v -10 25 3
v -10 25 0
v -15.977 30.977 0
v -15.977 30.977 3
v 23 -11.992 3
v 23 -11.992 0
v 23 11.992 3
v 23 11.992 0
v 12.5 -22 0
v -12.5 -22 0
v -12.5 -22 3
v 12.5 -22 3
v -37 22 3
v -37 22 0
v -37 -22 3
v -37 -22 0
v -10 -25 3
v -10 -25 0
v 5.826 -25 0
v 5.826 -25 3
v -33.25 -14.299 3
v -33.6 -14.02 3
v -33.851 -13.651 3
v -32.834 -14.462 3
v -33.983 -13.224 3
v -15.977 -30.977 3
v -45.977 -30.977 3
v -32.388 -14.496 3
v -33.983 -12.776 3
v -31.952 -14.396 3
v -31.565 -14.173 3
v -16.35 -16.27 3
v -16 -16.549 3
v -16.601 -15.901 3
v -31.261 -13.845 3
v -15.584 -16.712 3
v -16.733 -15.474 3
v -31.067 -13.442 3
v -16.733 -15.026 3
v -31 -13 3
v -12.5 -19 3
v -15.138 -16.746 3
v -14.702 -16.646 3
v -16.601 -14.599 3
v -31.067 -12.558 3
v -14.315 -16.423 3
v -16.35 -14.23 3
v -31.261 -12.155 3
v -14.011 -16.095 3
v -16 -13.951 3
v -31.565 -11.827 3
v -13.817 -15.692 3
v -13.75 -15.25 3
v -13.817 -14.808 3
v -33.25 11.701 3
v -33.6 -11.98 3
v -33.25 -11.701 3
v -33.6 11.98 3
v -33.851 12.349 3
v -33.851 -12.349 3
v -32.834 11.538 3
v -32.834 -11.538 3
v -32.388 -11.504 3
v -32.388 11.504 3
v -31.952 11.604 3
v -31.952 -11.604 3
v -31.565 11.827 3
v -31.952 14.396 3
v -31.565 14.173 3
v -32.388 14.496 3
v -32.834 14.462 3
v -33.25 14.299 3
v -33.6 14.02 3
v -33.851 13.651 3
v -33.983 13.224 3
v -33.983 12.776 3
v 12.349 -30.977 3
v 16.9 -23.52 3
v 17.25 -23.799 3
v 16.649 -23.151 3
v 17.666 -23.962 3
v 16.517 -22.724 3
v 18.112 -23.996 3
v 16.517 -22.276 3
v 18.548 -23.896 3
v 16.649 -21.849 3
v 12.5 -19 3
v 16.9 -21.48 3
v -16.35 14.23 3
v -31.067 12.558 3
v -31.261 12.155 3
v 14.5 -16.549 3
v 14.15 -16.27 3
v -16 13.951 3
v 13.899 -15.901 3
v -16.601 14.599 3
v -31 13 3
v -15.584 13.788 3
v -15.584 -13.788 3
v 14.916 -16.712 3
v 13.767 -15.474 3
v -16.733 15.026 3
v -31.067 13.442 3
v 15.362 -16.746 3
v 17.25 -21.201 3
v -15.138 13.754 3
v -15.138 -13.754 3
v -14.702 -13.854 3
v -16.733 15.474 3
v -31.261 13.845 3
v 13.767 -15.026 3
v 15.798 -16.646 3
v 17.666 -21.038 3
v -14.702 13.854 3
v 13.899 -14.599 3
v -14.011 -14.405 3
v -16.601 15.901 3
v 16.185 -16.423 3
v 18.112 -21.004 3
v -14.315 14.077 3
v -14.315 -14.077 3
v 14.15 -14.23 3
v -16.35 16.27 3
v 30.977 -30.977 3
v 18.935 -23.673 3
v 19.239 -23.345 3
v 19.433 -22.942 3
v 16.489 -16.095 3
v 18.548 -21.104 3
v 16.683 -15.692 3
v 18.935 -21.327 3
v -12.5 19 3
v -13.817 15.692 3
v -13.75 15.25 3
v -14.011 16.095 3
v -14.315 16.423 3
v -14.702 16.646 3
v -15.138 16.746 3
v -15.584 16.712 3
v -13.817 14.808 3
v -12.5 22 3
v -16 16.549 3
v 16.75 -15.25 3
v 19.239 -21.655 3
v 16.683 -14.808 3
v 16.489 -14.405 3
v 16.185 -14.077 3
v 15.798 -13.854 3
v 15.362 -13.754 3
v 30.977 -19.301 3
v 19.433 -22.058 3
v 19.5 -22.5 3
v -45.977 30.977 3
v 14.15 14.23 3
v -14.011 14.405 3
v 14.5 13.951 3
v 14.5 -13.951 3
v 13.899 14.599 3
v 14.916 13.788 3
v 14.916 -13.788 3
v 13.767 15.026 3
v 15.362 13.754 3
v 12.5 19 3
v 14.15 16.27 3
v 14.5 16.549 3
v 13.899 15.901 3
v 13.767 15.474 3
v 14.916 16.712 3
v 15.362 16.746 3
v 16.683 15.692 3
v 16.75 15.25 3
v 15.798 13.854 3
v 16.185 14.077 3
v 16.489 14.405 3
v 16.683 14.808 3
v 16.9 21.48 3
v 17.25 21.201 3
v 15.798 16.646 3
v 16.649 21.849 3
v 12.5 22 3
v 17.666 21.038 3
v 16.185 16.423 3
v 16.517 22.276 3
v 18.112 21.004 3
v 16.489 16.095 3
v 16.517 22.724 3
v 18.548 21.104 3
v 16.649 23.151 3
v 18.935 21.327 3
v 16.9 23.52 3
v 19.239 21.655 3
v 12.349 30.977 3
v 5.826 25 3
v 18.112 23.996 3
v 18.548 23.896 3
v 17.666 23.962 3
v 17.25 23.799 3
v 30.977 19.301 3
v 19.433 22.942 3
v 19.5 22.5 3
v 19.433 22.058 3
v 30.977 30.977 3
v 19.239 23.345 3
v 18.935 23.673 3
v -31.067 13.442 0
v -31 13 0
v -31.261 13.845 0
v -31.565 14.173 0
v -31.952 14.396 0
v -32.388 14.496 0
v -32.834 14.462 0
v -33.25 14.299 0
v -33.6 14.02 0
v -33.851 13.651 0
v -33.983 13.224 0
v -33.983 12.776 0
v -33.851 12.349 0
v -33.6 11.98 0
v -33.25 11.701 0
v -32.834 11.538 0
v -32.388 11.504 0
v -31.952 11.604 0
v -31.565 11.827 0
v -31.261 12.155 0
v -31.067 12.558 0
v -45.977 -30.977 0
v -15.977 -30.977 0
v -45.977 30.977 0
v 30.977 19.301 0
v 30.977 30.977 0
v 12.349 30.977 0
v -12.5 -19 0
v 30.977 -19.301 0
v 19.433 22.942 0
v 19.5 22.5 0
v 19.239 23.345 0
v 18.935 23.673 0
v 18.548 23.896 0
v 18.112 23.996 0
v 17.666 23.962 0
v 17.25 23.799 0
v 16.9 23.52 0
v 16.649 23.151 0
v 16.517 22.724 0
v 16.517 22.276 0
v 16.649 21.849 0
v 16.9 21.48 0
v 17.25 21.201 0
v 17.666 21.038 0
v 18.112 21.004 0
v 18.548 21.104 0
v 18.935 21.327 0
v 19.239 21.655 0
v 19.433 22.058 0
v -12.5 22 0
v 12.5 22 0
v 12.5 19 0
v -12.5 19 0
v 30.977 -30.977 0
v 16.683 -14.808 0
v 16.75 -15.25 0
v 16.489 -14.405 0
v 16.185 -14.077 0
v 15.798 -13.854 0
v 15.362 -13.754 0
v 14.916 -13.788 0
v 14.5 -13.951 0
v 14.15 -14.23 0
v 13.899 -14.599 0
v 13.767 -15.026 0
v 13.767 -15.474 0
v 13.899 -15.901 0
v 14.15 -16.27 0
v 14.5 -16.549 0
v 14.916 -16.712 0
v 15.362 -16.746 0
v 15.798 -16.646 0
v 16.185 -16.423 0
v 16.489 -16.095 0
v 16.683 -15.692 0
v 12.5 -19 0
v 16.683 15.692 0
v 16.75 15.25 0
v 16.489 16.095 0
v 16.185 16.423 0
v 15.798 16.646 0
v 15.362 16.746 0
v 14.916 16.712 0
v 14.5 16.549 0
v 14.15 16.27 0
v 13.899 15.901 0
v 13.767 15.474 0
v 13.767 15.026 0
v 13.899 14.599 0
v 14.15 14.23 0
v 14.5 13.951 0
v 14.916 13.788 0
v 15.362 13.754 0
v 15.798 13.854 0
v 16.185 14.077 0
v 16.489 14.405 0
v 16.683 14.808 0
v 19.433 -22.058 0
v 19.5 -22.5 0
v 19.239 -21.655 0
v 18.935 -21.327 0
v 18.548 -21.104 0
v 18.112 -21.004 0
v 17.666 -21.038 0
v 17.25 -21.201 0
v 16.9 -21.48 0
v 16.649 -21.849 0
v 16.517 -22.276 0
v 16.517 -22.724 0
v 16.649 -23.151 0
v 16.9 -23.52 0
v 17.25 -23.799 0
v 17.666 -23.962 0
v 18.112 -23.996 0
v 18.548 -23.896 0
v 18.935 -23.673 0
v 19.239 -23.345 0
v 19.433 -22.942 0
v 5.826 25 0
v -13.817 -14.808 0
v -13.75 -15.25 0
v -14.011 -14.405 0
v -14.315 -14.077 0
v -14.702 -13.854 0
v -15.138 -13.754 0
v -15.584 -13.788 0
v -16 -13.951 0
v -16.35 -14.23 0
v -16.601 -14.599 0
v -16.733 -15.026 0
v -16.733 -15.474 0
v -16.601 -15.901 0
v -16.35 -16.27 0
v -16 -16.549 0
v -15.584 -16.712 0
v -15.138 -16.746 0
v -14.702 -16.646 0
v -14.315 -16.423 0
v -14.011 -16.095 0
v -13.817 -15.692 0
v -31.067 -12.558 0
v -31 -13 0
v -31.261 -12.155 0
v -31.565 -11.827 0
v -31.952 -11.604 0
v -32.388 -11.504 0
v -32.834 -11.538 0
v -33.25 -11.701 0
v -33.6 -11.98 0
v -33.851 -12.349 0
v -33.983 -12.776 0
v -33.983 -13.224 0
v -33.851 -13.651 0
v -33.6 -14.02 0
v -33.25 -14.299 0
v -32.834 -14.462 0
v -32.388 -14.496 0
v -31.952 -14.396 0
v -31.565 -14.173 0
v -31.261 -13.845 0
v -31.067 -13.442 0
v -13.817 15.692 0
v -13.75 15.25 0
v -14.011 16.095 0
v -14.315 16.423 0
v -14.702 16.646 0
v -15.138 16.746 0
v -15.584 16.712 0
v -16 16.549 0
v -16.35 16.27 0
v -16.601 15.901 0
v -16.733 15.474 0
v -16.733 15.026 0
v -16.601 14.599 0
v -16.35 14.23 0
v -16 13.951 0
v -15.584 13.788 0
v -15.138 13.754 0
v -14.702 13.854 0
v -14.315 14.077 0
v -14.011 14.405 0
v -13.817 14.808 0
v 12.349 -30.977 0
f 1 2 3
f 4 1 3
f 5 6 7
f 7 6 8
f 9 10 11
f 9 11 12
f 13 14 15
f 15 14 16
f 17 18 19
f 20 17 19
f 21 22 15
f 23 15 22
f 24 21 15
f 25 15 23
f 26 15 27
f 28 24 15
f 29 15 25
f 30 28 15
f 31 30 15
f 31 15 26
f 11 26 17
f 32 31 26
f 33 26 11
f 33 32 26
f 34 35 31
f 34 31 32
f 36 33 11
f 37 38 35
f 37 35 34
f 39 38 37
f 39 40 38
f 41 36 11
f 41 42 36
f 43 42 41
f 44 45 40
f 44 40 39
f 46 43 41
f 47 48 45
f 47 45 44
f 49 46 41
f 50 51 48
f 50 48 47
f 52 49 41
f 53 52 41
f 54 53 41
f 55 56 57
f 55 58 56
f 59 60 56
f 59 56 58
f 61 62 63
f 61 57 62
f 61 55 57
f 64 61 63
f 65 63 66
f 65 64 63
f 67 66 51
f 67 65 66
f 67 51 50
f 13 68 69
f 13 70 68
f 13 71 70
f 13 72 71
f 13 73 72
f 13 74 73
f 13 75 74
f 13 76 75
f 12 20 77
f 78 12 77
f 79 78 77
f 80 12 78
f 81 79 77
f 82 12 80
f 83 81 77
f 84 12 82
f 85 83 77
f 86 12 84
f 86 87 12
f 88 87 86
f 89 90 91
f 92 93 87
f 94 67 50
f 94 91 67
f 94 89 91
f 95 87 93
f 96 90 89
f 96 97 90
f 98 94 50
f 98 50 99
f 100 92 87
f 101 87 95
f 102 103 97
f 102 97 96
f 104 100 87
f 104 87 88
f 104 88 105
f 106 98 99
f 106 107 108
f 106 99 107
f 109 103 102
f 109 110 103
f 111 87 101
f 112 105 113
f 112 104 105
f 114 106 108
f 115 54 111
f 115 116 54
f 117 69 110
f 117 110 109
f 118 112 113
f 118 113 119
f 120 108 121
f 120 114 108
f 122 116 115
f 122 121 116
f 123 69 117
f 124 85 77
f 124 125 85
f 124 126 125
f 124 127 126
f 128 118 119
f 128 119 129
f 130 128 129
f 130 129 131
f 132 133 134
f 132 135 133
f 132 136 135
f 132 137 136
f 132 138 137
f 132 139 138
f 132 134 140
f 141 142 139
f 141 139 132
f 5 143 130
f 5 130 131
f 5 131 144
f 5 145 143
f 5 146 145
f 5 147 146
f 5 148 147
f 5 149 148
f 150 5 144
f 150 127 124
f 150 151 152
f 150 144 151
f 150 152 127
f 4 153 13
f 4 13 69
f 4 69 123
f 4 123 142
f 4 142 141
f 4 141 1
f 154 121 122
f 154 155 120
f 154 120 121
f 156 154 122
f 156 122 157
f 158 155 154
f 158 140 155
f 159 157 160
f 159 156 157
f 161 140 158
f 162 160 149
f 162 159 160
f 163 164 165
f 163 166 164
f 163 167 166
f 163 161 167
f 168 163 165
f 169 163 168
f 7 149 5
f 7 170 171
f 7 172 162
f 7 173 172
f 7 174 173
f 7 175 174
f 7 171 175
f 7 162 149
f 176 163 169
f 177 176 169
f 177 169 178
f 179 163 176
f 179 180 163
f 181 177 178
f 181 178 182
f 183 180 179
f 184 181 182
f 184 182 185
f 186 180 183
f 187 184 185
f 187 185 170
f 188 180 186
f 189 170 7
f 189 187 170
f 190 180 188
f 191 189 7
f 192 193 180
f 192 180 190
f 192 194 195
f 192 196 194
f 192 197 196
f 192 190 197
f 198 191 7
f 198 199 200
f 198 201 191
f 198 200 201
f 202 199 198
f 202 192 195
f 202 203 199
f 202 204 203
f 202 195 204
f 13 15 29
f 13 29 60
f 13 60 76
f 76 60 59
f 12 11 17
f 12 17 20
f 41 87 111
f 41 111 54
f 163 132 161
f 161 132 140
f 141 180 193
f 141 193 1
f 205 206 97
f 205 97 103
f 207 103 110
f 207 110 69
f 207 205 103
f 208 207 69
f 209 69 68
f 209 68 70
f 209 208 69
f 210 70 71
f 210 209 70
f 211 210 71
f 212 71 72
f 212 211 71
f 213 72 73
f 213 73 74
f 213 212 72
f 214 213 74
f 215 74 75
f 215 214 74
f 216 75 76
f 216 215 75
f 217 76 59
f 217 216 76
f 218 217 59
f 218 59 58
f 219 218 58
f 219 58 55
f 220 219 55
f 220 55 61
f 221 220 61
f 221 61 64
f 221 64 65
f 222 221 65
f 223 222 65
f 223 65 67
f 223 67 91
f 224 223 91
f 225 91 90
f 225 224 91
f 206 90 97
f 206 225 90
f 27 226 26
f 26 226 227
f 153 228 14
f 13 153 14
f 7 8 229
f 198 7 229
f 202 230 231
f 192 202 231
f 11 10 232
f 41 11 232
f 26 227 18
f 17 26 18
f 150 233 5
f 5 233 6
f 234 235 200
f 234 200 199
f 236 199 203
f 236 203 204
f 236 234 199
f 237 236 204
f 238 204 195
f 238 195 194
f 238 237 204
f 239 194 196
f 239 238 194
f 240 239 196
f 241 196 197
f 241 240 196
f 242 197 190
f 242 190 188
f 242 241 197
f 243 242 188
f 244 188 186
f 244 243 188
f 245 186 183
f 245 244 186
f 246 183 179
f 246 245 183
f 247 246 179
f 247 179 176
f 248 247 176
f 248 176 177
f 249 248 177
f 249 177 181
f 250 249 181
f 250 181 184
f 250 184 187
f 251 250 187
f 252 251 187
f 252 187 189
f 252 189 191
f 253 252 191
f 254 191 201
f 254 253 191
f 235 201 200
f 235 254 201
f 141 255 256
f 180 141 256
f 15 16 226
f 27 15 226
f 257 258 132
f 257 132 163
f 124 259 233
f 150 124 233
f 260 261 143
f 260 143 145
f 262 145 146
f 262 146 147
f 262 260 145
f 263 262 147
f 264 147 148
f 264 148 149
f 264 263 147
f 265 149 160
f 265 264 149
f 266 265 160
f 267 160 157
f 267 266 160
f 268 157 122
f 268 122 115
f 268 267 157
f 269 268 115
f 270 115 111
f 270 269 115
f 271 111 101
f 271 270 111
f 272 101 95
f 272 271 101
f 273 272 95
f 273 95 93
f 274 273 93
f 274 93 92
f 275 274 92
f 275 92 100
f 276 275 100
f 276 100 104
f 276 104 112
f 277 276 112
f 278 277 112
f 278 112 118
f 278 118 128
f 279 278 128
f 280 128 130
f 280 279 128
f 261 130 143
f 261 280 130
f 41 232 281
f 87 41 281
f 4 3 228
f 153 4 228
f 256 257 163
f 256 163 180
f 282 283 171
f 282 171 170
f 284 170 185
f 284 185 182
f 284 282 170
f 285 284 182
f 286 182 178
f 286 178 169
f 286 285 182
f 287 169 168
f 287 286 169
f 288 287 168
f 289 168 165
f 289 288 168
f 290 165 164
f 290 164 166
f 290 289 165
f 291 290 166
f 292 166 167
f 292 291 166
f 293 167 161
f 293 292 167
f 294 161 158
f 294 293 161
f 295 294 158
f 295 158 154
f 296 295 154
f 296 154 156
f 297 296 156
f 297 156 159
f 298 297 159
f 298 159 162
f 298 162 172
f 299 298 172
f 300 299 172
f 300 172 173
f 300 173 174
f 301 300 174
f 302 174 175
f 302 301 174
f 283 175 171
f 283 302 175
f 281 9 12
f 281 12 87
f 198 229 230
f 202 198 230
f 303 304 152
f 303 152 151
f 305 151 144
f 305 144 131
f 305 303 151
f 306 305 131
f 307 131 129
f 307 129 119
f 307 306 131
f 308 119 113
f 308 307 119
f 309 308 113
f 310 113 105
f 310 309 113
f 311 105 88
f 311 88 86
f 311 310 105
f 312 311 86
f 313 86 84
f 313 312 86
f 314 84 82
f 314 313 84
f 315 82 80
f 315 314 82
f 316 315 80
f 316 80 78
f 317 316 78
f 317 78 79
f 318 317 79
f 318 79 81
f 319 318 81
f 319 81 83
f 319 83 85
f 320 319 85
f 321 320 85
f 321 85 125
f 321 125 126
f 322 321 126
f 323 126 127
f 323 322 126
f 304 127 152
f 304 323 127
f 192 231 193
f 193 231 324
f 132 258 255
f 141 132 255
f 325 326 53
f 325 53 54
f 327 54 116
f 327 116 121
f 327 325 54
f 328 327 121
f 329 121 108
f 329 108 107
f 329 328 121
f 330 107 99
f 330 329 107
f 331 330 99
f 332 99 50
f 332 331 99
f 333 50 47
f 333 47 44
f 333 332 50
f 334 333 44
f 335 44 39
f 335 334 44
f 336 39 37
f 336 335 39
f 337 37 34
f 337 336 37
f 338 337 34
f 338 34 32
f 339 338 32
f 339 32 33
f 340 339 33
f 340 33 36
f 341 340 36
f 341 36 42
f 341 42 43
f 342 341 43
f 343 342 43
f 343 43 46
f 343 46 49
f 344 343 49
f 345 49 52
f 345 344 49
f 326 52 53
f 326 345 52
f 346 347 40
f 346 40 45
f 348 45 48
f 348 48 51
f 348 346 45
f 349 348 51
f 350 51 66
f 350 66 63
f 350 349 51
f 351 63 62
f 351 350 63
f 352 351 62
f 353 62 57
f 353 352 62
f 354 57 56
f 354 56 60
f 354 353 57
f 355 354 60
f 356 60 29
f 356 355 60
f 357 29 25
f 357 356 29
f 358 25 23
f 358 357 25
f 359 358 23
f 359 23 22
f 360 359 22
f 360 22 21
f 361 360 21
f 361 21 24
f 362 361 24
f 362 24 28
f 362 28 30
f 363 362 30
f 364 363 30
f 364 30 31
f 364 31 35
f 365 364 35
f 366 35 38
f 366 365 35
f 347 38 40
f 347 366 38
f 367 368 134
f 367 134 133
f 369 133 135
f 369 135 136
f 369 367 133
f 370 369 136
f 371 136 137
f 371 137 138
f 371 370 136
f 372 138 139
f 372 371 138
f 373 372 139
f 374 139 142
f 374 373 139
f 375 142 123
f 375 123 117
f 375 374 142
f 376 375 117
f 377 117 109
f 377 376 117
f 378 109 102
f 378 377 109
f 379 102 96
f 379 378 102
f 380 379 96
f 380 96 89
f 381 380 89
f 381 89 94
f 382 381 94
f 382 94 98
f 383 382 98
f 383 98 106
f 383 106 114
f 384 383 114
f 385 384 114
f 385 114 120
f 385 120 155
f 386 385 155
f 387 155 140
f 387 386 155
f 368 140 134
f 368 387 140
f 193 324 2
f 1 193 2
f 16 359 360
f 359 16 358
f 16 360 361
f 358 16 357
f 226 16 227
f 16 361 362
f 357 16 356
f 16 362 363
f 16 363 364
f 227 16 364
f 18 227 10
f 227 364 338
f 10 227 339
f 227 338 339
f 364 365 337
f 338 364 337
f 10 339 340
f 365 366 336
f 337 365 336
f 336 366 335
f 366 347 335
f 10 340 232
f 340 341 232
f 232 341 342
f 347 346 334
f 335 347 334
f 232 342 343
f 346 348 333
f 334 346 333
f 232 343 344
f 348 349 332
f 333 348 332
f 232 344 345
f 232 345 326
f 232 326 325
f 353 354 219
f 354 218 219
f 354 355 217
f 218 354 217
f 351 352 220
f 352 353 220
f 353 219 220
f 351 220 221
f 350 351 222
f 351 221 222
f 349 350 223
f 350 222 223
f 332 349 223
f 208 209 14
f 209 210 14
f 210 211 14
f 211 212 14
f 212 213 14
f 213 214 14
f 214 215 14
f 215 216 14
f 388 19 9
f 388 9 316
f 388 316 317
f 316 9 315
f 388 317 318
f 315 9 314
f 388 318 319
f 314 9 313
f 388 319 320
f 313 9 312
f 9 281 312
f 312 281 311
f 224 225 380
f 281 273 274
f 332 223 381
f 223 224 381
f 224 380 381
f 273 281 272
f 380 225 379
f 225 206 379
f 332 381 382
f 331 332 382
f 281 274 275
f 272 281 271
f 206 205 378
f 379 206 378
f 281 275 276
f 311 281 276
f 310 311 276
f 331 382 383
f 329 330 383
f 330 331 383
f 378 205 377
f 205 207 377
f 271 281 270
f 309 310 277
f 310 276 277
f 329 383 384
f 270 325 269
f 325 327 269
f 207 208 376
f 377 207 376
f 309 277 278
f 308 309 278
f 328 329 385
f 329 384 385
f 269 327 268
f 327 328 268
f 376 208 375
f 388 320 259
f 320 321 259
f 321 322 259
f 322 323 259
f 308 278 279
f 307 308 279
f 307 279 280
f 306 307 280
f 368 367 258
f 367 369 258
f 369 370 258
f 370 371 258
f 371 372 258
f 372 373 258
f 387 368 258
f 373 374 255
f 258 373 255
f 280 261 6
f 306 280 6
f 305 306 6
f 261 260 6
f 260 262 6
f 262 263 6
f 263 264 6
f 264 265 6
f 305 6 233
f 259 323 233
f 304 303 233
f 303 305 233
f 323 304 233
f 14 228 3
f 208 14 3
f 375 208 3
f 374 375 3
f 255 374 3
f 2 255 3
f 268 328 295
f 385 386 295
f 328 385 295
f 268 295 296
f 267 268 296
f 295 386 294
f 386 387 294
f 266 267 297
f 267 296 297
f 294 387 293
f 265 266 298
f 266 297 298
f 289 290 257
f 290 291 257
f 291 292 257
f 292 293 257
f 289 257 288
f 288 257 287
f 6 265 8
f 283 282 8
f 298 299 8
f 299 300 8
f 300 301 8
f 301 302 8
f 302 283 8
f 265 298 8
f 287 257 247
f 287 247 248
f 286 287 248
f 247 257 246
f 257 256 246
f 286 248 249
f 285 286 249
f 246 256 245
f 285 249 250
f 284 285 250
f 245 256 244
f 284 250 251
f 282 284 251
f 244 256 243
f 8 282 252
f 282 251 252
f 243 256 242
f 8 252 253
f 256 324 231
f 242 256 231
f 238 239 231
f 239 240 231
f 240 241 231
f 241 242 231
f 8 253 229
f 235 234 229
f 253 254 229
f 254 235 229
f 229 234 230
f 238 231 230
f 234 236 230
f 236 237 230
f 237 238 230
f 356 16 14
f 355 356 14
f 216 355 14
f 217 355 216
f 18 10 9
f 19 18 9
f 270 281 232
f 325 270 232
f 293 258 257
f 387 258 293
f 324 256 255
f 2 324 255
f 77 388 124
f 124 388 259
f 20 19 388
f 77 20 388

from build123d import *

# Parameters (mm, degrees)
F0_R     = 1.5
F0_W     = 25
F0_H     = 3
F1_DEPTH = 3


with BuildPart() as f1:
    # F0 (on Top) → F1 (new body)
    with BuildSketch(Plane.XY):
        Polygon((5.826227, 25), (-10, 25), (-15.97664, 30.97664), (-45.976639, 30.97664), (-37, 22), (-37, -22), (-45.976639, -30.97664), (-15.97664, -30.97664), (-10, -25), (5.826227, -25), (12.348584, -30.97664), (30.97664, -30.97664), (30.97664, -19.30114), (23, -11.991897), (23, 11.991897), (30.97664, 19.30114), (30.97664, 30.97664), (12.348584, 30.97664), align=None)
        with Locations((-32.5, -13)):
            Circle(F0_R, mode=Mode.SUBTRACT)
        with Locations((-15.25, -15.25)):
            Circle(F0_R, mode=Mode.SUBTRACT)
        with Locations((0, -20.5)):
            Rectangle(F0_W, F0_H, mode=Mode.SUBTRACT)
        with Locations((18, -22.5)):
            Circle(F0_R, mode=Mode.SUBTRACT)
        with Locations((15.25, -15.25)):
            Circle(F0_R, mode=Mode.SUBTRACT)
        with Locations((-32.5, 13)):
            Circle(F0_R, mode=Mode.SUBTRACT)
        with Locations((-15.25, 15.25)):
            Circle(F0_R, mode=Mode.SUBTRACT)
        with Locations((15.25, 15.25)):
            Circle(F0_R, mode=Mode.SUBTRACT)
        with Locations((0, 20.5)):
            Rectangle(F0_W, F0_H, mode=Mode.SUBTRACT)
        with Locations((18, 22.5)):
            Circle(F0_R, mode=Mode.SUBTRACT)
    extrude(amount=F1_DEPTH)


solid = f1.part
